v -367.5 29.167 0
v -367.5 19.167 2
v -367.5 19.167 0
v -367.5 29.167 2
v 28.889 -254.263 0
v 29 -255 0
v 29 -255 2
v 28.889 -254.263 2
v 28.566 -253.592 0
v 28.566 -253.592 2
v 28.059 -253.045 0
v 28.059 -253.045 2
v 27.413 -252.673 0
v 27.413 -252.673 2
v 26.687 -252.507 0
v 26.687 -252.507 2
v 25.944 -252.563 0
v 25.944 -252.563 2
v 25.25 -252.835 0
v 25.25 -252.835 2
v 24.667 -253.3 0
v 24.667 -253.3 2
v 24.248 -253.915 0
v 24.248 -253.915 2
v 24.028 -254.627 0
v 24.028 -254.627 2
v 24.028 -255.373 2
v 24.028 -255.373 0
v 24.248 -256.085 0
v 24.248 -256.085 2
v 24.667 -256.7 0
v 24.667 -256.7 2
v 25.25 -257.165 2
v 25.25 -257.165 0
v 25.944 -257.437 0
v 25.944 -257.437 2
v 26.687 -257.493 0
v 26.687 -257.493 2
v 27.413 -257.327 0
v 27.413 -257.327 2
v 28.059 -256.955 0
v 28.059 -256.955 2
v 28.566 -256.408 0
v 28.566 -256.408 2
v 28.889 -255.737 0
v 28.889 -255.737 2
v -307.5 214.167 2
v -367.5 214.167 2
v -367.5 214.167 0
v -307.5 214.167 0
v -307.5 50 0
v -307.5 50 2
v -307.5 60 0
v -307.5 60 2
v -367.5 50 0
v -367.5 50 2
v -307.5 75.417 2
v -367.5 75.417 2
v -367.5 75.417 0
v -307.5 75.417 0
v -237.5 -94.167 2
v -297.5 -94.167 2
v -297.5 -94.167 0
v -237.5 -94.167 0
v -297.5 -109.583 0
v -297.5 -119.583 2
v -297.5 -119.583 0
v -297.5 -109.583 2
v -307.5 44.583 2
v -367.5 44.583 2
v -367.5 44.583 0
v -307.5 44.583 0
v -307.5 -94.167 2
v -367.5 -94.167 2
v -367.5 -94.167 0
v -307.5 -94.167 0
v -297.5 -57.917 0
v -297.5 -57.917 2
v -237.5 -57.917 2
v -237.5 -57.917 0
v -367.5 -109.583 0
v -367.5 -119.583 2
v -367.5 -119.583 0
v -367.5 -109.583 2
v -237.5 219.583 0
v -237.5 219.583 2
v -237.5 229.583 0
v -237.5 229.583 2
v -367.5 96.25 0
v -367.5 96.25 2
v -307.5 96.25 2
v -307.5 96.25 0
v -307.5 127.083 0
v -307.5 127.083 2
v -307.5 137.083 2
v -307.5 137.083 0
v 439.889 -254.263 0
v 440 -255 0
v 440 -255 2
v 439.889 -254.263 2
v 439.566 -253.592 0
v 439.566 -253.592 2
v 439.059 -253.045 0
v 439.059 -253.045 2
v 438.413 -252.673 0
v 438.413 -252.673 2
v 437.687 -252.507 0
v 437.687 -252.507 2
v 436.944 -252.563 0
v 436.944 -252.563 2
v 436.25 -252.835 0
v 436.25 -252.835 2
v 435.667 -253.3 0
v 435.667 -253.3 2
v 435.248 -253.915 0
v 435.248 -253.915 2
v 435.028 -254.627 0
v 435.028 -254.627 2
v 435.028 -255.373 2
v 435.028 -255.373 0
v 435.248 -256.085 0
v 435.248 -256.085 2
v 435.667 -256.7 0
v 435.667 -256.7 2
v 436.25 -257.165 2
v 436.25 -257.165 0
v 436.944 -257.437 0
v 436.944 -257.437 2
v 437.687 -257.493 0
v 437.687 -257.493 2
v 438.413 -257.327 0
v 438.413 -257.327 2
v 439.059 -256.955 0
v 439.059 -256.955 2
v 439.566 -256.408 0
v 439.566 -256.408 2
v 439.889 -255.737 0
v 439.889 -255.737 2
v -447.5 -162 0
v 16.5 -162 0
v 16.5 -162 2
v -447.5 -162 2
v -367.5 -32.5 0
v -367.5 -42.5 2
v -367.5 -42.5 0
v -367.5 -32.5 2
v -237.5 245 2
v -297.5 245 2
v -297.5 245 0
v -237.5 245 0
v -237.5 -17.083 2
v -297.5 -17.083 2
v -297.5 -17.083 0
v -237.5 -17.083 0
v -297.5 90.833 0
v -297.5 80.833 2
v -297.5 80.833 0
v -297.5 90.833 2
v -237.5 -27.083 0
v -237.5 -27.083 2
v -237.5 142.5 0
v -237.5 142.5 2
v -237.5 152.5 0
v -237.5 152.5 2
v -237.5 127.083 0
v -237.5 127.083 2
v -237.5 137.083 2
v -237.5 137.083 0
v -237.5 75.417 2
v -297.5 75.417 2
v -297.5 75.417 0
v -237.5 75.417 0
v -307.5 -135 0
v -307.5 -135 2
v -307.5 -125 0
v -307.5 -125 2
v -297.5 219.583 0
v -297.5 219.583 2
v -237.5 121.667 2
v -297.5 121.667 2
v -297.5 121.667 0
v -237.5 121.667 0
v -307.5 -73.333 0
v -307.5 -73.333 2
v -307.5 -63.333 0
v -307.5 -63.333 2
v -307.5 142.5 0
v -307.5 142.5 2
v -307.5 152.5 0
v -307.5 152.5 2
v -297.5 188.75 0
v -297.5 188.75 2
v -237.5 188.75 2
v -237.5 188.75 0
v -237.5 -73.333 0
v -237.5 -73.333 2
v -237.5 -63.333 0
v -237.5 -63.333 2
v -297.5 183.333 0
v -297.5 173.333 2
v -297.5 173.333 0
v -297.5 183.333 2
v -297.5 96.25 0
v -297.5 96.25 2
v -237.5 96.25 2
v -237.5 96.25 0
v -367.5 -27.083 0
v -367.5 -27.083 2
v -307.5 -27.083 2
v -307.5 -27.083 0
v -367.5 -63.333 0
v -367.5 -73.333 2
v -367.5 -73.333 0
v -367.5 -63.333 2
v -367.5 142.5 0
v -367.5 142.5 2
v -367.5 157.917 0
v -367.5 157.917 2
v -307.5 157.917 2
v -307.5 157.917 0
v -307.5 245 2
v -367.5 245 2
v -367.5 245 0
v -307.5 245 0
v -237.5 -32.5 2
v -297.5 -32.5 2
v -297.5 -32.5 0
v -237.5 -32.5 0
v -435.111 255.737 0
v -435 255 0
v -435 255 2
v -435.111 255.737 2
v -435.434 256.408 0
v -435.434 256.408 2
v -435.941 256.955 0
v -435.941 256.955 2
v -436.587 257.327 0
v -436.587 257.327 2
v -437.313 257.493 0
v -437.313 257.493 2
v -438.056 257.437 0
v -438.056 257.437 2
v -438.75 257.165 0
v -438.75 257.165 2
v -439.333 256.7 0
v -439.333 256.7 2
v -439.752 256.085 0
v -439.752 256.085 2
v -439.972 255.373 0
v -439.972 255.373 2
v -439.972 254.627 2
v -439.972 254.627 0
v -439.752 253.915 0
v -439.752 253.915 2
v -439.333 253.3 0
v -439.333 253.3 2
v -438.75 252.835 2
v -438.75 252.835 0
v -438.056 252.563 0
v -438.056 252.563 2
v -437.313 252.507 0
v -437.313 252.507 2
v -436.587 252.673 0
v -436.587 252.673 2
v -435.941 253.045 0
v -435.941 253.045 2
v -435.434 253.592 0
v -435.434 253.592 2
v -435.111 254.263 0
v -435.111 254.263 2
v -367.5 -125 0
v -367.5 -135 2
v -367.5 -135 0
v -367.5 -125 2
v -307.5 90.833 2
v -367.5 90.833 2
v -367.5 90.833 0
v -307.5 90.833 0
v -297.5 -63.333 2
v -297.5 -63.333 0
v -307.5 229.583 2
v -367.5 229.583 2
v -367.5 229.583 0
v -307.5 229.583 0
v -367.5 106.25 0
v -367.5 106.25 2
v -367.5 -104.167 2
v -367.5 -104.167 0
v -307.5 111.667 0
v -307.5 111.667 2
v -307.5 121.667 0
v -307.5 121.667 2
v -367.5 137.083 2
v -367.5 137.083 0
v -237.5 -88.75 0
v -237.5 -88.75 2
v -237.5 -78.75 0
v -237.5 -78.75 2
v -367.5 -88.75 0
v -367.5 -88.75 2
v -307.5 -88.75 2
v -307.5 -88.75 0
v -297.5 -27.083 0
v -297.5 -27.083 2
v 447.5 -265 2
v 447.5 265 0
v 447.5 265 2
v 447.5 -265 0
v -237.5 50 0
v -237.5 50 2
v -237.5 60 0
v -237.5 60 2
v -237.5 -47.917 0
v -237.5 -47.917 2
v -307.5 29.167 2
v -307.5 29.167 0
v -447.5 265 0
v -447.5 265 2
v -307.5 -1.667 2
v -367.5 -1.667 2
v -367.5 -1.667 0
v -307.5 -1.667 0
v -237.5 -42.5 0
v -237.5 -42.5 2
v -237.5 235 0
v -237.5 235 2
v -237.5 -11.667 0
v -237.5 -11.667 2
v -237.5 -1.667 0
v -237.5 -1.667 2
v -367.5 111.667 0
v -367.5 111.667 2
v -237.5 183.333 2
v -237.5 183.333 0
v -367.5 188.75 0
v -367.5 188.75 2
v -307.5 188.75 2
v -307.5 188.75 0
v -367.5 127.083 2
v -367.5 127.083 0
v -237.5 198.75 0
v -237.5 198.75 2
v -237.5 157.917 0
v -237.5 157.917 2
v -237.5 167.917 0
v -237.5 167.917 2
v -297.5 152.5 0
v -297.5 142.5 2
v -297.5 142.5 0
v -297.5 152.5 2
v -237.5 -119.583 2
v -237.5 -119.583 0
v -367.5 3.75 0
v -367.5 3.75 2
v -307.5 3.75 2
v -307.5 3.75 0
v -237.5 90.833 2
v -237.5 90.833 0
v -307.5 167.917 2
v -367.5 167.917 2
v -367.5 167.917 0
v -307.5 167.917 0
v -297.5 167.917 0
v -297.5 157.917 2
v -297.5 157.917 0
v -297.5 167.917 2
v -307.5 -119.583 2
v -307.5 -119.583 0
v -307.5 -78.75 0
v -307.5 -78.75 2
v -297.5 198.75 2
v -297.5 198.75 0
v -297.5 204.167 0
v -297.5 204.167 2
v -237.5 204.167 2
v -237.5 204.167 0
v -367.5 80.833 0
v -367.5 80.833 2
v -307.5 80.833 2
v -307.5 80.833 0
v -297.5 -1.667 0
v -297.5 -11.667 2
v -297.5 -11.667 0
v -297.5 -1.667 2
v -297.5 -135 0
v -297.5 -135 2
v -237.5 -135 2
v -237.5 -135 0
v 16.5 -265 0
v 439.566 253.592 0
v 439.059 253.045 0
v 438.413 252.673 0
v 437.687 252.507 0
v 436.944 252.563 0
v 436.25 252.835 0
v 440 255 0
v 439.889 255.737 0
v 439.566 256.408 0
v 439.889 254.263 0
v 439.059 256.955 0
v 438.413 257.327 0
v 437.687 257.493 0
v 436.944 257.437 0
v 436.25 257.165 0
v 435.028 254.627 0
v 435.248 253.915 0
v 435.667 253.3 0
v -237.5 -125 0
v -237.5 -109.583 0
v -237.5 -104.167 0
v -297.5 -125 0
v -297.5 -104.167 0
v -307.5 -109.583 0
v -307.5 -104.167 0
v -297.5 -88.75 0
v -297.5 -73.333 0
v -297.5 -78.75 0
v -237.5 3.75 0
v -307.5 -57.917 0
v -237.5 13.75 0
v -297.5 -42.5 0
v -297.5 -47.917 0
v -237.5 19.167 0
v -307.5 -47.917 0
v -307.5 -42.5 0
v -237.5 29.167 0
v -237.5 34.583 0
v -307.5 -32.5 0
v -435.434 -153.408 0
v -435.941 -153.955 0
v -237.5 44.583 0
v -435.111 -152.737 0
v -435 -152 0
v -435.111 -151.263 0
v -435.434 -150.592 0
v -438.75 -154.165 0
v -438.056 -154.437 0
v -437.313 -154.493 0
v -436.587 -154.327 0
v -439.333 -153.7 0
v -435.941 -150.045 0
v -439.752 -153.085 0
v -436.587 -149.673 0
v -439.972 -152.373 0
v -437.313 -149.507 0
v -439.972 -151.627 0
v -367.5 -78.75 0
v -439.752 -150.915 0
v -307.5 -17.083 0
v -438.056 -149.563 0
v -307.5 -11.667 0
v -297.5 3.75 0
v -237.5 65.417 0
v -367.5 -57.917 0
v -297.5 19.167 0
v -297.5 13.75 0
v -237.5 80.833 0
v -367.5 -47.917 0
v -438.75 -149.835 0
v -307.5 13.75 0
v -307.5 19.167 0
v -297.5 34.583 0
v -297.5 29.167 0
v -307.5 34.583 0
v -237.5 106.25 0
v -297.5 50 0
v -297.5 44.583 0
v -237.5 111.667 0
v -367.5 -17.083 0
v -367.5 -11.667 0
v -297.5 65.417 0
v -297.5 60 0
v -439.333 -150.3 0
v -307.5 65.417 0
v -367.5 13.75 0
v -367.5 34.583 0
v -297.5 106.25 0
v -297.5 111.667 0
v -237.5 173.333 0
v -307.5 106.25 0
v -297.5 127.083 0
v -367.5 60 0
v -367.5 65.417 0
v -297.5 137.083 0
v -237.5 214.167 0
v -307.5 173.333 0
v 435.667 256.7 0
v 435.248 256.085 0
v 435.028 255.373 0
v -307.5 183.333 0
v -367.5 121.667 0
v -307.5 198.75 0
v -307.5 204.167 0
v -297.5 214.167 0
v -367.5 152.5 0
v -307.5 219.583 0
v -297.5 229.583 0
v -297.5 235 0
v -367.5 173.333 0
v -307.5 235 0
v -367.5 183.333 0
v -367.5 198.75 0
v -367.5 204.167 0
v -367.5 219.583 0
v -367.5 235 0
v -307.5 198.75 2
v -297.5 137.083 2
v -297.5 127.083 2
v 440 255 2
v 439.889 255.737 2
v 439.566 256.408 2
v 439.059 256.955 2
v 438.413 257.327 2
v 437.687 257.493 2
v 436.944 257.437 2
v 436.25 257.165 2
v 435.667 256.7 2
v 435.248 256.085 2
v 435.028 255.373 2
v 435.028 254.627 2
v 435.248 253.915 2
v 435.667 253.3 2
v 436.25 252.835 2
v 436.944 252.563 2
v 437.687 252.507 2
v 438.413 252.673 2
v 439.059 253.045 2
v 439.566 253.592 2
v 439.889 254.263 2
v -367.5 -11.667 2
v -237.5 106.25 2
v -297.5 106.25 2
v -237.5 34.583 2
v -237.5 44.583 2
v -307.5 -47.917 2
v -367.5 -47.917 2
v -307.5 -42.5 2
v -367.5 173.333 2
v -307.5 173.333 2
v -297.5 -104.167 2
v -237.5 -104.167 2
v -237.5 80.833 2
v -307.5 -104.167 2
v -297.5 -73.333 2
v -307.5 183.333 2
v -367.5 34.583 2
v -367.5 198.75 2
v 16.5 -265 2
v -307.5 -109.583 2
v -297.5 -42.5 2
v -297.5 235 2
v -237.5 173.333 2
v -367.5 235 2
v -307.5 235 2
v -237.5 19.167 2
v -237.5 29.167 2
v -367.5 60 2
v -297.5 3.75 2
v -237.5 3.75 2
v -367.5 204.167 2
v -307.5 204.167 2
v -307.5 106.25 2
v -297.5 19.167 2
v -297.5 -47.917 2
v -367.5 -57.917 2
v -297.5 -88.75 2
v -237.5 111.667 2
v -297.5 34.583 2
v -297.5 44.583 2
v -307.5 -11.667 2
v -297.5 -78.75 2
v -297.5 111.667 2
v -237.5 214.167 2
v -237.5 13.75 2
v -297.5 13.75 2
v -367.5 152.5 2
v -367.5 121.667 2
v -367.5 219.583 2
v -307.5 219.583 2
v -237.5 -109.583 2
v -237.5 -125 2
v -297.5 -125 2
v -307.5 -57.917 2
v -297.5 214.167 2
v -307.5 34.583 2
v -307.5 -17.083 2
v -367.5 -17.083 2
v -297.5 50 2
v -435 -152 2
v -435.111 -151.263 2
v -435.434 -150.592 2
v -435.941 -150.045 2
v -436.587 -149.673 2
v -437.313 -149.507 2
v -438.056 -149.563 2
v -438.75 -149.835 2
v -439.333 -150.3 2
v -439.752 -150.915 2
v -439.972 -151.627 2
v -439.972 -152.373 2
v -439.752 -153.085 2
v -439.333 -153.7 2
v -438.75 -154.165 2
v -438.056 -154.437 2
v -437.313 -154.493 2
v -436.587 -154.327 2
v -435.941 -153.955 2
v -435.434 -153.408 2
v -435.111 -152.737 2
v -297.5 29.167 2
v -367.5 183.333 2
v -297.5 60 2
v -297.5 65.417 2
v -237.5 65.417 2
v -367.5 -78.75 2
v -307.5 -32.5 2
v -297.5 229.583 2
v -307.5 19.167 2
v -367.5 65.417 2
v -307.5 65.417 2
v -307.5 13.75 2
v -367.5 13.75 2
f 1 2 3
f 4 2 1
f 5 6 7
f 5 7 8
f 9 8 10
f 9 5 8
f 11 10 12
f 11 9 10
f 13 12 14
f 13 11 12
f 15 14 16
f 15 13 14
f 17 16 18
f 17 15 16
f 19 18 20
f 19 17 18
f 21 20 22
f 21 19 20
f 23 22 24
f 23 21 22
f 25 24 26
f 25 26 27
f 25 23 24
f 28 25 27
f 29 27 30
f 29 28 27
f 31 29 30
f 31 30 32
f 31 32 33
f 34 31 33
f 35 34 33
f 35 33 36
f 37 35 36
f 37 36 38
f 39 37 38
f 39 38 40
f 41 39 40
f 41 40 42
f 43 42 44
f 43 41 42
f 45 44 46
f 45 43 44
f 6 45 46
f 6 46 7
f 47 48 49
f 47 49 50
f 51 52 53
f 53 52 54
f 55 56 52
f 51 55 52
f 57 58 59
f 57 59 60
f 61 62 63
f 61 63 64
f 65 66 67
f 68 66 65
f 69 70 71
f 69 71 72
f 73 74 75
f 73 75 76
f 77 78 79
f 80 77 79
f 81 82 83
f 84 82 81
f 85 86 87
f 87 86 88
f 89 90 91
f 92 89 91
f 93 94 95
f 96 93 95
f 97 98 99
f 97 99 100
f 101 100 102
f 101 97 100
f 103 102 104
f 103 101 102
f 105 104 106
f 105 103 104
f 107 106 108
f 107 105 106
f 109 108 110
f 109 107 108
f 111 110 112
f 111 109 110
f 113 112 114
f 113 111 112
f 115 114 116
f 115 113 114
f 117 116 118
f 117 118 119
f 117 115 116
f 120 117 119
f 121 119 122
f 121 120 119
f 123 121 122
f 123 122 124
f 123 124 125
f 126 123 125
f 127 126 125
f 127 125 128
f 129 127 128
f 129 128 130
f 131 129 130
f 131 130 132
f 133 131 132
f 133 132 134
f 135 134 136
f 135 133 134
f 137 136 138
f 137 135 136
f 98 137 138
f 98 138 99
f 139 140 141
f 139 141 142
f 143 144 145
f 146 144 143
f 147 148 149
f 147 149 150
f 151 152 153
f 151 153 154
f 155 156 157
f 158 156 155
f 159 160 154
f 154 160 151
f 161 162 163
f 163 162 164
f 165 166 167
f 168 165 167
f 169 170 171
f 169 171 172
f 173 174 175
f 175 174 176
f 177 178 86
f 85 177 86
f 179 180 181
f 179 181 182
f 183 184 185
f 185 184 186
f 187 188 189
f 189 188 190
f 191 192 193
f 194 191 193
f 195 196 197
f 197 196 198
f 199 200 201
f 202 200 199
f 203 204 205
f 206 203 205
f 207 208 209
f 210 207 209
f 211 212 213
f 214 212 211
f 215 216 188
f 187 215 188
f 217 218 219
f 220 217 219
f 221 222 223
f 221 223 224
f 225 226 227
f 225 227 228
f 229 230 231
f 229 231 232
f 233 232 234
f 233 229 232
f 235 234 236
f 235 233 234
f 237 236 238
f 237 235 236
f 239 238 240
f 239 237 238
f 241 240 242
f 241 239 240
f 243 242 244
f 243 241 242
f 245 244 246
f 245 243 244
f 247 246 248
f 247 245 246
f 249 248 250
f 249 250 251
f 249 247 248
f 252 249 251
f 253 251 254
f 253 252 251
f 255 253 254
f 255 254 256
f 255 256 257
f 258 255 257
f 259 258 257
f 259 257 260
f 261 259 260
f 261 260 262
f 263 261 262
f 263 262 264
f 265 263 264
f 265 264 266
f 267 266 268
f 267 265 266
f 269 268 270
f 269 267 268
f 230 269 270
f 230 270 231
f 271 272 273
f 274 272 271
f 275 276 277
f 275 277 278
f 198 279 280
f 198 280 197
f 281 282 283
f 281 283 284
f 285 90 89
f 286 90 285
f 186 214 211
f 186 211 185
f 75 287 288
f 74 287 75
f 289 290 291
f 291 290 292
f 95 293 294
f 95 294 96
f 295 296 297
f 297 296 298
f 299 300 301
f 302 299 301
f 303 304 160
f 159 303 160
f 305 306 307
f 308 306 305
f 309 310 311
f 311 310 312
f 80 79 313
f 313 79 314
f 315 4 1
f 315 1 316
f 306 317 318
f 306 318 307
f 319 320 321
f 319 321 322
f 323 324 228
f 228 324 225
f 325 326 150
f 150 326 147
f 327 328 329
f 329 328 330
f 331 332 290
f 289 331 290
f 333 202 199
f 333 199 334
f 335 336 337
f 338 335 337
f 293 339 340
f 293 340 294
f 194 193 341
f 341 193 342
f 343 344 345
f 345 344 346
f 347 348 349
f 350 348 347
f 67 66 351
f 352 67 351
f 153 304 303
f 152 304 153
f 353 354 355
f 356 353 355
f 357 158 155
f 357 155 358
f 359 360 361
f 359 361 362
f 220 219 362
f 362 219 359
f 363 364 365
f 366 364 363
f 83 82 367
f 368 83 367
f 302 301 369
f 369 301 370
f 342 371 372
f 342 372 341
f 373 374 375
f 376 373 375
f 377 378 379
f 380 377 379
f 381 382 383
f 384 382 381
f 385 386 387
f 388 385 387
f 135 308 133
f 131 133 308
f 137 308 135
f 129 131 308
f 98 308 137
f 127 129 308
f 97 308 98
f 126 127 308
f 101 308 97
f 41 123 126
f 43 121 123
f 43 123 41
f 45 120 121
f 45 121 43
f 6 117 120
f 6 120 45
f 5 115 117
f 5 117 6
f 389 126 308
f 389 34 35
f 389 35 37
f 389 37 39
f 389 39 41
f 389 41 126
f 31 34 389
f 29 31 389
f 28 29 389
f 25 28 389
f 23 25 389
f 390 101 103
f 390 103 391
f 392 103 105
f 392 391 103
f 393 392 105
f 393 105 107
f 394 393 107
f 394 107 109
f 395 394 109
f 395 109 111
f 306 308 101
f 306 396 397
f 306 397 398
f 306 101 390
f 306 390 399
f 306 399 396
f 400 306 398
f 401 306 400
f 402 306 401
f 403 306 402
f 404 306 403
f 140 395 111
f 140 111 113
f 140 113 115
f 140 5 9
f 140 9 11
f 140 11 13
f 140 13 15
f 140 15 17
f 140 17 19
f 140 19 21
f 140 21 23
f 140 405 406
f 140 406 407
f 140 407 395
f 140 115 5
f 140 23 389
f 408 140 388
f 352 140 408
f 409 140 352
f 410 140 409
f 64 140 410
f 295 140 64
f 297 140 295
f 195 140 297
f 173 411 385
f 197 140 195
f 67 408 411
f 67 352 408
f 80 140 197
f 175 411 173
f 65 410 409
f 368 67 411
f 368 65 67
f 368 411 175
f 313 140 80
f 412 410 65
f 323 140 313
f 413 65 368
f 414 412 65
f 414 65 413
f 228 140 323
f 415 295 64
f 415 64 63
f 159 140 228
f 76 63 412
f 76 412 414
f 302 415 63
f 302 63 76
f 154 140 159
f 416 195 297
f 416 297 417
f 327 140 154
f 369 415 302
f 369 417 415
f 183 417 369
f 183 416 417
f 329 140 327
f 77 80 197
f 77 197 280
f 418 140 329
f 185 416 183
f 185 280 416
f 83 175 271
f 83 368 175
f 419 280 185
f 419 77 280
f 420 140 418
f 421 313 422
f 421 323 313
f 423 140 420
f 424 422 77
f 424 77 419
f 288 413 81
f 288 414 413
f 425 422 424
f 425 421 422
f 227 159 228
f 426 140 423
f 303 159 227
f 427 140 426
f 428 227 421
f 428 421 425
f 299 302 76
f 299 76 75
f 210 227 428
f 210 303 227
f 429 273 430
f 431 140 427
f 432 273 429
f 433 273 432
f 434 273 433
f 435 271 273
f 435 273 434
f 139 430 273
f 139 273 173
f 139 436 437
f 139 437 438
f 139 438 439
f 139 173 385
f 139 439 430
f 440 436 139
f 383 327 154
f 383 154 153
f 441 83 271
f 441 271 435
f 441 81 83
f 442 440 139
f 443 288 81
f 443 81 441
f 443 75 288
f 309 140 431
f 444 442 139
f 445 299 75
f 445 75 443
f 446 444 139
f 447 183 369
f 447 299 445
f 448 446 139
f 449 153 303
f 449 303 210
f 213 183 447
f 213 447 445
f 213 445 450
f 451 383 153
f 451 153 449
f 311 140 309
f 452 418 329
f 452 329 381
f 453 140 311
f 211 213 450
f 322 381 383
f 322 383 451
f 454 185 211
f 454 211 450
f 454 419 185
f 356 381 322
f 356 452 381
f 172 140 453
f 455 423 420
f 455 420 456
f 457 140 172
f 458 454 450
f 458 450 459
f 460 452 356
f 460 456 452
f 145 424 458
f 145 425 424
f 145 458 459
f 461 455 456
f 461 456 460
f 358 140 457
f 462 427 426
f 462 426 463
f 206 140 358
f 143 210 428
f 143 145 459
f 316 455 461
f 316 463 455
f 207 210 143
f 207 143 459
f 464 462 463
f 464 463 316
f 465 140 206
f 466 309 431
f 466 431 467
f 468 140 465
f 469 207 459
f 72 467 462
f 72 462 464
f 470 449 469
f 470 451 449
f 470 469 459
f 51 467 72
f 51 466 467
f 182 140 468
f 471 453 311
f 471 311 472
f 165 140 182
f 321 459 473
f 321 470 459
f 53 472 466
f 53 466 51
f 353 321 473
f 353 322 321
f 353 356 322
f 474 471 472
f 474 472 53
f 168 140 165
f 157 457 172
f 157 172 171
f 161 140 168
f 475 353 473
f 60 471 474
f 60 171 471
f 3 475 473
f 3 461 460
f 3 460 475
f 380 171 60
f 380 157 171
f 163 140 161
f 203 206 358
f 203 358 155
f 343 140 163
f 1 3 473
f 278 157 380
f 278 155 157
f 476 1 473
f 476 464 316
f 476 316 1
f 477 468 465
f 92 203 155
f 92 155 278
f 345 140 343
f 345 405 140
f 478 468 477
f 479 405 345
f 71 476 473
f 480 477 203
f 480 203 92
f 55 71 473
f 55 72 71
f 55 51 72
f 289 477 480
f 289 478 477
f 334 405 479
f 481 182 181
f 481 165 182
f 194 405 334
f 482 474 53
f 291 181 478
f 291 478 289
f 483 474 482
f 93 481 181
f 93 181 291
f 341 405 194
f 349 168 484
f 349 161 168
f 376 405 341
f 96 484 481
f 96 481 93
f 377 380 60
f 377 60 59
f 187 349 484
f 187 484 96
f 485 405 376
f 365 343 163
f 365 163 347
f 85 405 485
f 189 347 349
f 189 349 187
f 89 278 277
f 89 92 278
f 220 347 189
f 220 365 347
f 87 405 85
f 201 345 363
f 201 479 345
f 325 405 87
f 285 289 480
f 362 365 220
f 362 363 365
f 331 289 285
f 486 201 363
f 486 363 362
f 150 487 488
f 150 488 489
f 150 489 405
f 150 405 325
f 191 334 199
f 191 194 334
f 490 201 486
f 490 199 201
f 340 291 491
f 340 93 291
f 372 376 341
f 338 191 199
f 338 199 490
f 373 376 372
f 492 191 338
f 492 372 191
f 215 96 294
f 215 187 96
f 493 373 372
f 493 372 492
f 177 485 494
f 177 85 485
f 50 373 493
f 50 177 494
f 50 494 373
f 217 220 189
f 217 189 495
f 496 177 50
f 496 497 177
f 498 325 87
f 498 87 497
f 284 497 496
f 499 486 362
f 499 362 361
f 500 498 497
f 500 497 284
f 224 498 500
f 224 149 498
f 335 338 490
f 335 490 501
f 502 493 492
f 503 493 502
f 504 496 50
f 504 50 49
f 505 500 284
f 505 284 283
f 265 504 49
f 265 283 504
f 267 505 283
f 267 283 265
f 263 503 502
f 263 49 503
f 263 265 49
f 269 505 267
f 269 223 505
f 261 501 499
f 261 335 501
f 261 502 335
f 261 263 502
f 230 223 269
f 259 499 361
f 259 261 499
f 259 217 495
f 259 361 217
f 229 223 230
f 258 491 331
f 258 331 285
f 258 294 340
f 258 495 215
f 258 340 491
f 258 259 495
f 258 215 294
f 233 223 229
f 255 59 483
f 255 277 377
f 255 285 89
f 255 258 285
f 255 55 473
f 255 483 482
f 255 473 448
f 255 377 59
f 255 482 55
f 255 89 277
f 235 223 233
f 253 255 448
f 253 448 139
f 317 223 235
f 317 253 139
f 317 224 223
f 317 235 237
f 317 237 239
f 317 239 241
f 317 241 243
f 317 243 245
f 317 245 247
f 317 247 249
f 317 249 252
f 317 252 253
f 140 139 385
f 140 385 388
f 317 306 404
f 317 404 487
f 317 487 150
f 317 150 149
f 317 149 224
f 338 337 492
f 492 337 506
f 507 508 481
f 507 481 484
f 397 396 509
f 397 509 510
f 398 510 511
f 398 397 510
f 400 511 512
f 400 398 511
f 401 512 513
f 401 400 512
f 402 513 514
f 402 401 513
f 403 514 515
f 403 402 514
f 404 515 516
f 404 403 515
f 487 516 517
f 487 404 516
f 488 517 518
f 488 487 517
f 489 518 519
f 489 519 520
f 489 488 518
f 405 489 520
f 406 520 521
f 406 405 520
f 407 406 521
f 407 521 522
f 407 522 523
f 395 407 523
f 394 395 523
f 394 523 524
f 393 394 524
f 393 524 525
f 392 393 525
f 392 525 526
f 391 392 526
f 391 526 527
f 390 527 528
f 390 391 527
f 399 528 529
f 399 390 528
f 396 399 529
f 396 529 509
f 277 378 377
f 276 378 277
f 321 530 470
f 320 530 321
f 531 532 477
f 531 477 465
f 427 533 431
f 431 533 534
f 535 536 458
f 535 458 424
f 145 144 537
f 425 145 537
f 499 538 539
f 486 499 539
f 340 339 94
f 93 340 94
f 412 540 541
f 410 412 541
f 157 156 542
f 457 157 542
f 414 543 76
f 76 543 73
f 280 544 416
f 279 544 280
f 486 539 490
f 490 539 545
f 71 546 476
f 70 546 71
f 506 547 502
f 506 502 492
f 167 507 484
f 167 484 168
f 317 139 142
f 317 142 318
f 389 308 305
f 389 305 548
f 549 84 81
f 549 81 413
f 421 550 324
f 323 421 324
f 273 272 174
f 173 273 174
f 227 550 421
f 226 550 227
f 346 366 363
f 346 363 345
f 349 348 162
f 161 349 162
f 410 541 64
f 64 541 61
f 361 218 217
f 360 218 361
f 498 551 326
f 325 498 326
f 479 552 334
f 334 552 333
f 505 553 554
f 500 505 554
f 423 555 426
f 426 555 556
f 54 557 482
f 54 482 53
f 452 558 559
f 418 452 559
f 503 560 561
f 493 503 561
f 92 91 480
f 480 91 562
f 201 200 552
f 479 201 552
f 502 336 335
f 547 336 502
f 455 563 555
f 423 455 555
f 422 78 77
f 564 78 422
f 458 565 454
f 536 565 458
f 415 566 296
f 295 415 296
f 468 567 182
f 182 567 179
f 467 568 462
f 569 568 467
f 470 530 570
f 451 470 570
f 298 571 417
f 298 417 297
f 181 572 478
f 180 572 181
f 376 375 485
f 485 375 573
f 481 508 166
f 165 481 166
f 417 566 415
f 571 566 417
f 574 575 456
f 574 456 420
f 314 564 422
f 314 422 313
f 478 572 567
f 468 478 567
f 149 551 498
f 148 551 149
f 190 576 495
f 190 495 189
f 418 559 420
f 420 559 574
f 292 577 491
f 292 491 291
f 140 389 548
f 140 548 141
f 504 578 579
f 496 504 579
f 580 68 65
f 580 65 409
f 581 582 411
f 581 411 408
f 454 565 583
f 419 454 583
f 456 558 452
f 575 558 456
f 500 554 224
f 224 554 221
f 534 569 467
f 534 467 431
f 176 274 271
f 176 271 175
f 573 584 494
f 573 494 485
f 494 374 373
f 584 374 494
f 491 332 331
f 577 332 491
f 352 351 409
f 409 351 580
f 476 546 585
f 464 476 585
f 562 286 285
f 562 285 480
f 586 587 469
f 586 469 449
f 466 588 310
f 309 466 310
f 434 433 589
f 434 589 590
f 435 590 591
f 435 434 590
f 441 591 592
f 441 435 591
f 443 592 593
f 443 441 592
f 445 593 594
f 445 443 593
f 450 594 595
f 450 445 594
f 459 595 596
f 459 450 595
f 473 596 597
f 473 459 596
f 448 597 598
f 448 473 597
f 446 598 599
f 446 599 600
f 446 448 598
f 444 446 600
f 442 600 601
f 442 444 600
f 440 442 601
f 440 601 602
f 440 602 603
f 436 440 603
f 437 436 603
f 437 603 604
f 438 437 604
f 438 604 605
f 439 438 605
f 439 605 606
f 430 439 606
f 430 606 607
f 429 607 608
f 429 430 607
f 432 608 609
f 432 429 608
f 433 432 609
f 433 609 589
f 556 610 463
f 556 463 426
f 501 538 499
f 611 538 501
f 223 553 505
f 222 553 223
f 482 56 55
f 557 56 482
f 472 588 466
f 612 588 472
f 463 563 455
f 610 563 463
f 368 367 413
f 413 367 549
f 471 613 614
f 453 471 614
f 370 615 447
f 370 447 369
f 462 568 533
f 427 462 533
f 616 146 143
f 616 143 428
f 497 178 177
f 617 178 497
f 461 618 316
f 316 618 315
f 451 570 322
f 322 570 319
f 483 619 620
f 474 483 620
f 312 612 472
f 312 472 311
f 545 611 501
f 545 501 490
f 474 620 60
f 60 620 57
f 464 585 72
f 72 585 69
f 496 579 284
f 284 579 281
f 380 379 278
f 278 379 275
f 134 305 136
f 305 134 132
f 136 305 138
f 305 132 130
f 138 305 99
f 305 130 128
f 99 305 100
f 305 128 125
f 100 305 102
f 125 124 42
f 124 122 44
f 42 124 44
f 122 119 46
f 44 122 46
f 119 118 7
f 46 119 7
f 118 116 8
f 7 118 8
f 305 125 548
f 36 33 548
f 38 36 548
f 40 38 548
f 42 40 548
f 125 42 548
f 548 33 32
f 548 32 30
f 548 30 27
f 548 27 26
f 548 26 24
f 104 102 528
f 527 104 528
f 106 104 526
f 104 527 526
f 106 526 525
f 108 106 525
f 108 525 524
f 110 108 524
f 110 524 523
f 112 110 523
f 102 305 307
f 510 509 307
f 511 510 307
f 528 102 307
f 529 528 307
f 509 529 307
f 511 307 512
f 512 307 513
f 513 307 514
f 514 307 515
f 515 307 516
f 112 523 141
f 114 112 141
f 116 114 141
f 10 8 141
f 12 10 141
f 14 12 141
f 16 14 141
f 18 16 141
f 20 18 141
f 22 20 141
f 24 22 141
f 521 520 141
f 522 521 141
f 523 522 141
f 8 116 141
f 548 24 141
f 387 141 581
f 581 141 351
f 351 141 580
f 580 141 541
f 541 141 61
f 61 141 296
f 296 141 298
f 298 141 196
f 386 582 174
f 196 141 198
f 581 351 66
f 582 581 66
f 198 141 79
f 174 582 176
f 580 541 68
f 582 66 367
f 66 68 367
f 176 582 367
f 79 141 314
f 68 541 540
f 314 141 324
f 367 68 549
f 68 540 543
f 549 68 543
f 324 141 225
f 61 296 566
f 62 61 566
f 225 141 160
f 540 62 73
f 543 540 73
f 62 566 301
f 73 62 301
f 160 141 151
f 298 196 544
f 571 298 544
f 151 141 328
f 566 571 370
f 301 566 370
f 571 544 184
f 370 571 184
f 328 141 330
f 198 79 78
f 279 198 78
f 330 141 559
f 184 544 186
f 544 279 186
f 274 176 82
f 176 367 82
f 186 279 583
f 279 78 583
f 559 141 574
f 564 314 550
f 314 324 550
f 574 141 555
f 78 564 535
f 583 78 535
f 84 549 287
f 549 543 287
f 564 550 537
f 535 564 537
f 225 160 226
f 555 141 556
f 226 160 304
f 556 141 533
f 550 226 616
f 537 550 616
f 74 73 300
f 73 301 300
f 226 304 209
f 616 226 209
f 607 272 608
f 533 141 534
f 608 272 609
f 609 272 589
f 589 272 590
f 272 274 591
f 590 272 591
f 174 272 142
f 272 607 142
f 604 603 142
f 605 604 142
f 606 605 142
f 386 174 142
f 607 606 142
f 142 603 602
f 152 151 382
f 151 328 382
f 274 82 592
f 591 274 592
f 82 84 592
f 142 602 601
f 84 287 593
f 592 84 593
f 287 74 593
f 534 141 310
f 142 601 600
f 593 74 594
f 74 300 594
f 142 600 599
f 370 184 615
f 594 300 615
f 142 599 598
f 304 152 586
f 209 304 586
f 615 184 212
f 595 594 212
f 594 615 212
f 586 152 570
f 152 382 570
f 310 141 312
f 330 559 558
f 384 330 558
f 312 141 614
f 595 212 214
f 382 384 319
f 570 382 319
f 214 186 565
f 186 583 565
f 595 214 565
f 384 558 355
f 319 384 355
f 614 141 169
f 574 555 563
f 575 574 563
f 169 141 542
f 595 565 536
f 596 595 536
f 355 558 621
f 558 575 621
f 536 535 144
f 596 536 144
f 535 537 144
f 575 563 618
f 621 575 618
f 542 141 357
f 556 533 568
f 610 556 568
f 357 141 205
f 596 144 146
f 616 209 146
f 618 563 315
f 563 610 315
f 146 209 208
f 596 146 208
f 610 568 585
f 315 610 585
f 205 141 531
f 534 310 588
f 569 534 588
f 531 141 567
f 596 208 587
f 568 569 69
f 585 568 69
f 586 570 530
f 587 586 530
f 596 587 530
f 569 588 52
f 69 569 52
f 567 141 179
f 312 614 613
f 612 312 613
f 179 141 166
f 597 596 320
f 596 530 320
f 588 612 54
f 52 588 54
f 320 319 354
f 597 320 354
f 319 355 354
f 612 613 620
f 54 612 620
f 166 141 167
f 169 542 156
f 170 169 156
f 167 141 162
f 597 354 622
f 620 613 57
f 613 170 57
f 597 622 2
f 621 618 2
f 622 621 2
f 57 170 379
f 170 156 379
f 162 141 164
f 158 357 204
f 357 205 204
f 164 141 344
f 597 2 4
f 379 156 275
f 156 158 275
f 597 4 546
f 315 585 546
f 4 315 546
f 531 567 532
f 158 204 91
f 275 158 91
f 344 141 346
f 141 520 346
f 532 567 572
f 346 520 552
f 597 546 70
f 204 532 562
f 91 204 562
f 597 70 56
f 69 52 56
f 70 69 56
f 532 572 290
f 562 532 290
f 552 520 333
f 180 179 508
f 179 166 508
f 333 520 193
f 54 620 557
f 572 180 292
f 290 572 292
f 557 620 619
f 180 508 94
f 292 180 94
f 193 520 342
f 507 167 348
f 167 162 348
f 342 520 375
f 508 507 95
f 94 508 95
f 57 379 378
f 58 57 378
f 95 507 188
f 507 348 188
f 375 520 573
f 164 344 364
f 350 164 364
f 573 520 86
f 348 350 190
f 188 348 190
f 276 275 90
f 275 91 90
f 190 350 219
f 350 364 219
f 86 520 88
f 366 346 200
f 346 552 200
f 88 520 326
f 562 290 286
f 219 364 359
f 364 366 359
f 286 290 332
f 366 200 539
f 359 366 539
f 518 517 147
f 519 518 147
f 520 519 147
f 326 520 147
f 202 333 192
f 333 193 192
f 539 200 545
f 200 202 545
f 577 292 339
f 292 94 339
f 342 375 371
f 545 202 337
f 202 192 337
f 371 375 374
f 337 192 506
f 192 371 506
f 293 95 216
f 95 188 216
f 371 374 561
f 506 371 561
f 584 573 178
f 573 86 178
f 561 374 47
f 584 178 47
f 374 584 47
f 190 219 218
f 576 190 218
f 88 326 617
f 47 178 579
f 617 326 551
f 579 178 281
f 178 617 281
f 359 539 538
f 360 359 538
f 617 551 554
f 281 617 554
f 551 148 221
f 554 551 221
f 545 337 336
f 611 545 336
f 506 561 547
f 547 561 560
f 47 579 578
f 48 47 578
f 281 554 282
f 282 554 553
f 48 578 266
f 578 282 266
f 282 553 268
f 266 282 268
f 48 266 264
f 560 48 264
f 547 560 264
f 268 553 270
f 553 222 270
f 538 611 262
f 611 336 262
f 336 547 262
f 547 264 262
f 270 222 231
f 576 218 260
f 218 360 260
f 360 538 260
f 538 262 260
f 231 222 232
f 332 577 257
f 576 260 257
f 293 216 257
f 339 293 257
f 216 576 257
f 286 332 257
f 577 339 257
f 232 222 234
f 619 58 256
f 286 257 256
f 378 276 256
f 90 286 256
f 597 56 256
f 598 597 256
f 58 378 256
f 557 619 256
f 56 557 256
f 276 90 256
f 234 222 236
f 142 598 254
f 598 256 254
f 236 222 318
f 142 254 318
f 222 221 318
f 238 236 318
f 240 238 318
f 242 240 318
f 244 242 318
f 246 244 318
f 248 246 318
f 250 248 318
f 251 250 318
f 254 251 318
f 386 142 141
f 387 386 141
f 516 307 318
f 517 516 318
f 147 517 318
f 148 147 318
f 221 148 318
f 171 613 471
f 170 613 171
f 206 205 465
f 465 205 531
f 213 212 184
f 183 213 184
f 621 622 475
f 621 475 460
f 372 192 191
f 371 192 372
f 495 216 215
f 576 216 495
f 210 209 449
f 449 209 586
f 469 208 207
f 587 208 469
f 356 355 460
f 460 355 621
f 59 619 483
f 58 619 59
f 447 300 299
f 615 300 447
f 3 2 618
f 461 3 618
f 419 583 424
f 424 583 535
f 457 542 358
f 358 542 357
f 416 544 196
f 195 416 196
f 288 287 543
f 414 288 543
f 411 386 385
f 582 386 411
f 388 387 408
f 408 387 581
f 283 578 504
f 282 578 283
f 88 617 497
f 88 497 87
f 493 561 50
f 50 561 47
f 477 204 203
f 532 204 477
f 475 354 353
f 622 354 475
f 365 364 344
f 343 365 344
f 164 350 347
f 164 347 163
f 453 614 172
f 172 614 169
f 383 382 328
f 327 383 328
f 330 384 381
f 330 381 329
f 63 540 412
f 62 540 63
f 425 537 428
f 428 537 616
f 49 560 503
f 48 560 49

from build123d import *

# Parameters (mm, degrees)
SKETCH_R            = 2.5
PAD_DEPTH           = 2
SKETCH001_W         = 60
SKETCH001_H         = 10
POCKET_DEPTH        = 5
LINEARPATTERN_COUNT = 25
LINEARPATTERN_PITCH = 15.416667


with BuildPart() as part:
    # Sketch → Pad (new body)
    with BuildSketch(Plane.XY):
        Polygon((16.5, -162), (-447.5, -162), (-447.5, 265), (447.5, 265), (447.5, -265), (16.5, -265), align=None)
        with Locations((-437.5, 255)):
            Circle(SKETCH_R, mode=Mode.SUBTRACT)
        with Locations((-437.5, -152)):
            Circle(SKETCH_R, mode=Mode.SUBTRACT)
        with Locations((26.5, -255)):
            Circle(SKETCH_R, mode=Mode.SUBTRACT)
        with Locations((437.5, -255)):
            Circle(SKETCH_R, mode=Mode.SUBTRACT)
        with Locations((437.5, 255)):
            Circle(SKETCH_R, mode=Mode.SUBTRACT)
    extrude(amount=PAD_DEPTH)

    # Sketch001 → Pocket (cut)
    with BuildSketch(Plane.XY.offset(2)):
        with Locations((-337.5, 240)):
            Rectangle(SKETCH001_W, SKETCH001_H)
        with Locations((-267.5, 240)):
            Rectangle(SKETCH001_W, SKETCH001_H)
    pocket = extrude(amount=-POCKET_DEPTH, mode=Mode.SUBTRACT)

    # LinearPattern: Pocket ×25
    with Locations(*[(0, -i * LINEARPATTERN_PITCH, 0) for i in range(1, LINEARPATTERN_COUNT)]):
        add(pocket, mode=Mode.SUBTRACT)


solid = part.part
